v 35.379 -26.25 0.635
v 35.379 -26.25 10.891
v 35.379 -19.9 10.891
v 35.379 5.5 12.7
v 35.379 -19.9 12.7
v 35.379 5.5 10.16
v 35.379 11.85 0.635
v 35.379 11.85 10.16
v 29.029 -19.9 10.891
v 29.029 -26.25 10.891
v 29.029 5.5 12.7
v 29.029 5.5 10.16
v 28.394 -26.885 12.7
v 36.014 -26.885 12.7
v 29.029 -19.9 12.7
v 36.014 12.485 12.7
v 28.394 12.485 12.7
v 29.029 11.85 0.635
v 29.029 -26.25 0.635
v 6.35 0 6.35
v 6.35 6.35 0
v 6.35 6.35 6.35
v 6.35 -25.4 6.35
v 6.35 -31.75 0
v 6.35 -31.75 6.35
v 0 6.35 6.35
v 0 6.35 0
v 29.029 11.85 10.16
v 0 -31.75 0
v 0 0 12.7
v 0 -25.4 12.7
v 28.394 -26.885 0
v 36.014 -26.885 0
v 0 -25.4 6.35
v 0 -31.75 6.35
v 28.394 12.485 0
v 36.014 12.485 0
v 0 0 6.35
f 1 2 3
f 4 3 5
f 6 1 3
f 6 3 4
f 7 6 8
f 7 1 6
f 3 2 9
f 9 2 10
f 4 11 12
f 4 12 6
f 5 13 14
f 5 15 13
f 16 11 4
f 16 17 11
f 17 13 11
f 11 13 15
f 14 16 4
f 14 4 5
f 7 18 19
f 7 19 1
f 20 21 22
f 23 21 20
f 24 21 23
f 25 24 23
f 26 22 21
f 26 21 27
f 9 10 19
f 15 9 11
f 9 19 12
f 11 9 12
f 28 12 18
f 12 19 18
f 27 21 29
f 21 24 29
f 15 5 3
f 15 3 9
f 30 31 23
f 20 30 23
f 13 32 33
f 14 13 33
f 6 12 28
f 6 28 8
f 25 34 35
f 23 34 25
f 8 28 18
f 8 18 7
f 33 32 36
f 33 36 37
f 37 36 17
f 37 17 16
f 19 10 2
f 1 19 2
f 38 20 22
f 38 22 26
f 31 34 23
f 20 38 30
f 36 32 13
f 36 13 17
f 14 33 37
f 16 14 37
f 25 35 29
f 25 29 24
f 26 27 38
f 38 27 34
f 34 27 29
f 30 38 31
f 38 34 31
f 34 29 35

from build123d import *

# Parameters (mm, degrees)
F0_W      = 6.35
F0_H      = 25.4
F1_DEPTH  = 12.7
F3_DEPTH  = 25.4
F0_W_2    = 7.62
F0_H_2    = 39.37
F4_DEPTH  = 12.7
F5_T      = -0.635
F6_W      = 6.35
F6_H      = 6.35
F7_DEPTH  = 6.35
F8_W      = 6.35
F8_H      = 6.35
F9_DEPTH  = 6.35
F10_W     = 6.35
F10_H     = 2.54
F11_DEPTH = 6.35
F12_W     = 6.35
F12_H     = 1.80901
F13_DEPTH = 6.35


with BuildPart() as f1:
    # F0 (on Top) → F1 (new body)
    with BuildSketch(Plane.XY):
        with Locations((3.175, -12.7)):
            Rectangle(F0_W, F0_H)
    extrude(amount=F1_DEPTH)

    # F2 (on face) → F3 (cut, through all)
    with BuildSketch(Plane.XZ.offset(25.4)):
        Polygon((0, 12.7), (6.35, 6.35), (6.35, 12.7), align=None)
    extrude(amount=-F3_DEPTH, mode=Mode.SUBTRACT)

    # F6 (on face) → F7 (join)
    with BuildSketch(Plane.XZ.offset(25.4)):
        with Locations((3.175, 3.175)):
            Rectangle(F6_W, F6_H)
    extrude(amount=F7_DEPTH)

    # F8 (on face) → F9 (join)
    with BuildSketch(Plane(origin=(0, 0, 0), x_dir=(-1, 0, 0), z_dir=(0, 1, 0))):
        with Locations((-3.175, 3.175)):
            Rectangle(F8_W, F8_H)
    extrude(amount=F9_DEPTH)


with BuildPart() as f4:
    # F0 (on Top) → F4 (new body)
    with BuildSketch(Plane.XY):
        with Locations((32.203595, -7.200366)):
            Rectangle(F0_W_2, F0_H_2)
    extrude(amount=F4_DEPTH)

    # F5
    f5_openings = [f4.faces().sort_by_distance(p)[0] for p in [
        (32.203595, -7.200366, 12.7),
    ]]
    offset(amount=F5_T, openings=f5_openings)

    # F10 (on face) → F11 (join)
    with BuildSketch(Plane.XZ.offset(-11.849634)):
        with Locations((32.203595, 11.43)):
            Rectangle(F10_W, F10_H)
    extrude(amount=F11_DEPTH)

    # F12 (on face) → F13 (join)
    with BuildSketch(Plane(origin=(0, -26.250366, 0), x_dir=(-1, 0, 0), z_dir=(0, 1, 0))):
        with Locations((-32.203595, 11.795495)):
            Rectangle(F12_W, F12_H)
    extrude(amount=F13_DEPTH)


solid = Compound([f1.part, f4.part])
